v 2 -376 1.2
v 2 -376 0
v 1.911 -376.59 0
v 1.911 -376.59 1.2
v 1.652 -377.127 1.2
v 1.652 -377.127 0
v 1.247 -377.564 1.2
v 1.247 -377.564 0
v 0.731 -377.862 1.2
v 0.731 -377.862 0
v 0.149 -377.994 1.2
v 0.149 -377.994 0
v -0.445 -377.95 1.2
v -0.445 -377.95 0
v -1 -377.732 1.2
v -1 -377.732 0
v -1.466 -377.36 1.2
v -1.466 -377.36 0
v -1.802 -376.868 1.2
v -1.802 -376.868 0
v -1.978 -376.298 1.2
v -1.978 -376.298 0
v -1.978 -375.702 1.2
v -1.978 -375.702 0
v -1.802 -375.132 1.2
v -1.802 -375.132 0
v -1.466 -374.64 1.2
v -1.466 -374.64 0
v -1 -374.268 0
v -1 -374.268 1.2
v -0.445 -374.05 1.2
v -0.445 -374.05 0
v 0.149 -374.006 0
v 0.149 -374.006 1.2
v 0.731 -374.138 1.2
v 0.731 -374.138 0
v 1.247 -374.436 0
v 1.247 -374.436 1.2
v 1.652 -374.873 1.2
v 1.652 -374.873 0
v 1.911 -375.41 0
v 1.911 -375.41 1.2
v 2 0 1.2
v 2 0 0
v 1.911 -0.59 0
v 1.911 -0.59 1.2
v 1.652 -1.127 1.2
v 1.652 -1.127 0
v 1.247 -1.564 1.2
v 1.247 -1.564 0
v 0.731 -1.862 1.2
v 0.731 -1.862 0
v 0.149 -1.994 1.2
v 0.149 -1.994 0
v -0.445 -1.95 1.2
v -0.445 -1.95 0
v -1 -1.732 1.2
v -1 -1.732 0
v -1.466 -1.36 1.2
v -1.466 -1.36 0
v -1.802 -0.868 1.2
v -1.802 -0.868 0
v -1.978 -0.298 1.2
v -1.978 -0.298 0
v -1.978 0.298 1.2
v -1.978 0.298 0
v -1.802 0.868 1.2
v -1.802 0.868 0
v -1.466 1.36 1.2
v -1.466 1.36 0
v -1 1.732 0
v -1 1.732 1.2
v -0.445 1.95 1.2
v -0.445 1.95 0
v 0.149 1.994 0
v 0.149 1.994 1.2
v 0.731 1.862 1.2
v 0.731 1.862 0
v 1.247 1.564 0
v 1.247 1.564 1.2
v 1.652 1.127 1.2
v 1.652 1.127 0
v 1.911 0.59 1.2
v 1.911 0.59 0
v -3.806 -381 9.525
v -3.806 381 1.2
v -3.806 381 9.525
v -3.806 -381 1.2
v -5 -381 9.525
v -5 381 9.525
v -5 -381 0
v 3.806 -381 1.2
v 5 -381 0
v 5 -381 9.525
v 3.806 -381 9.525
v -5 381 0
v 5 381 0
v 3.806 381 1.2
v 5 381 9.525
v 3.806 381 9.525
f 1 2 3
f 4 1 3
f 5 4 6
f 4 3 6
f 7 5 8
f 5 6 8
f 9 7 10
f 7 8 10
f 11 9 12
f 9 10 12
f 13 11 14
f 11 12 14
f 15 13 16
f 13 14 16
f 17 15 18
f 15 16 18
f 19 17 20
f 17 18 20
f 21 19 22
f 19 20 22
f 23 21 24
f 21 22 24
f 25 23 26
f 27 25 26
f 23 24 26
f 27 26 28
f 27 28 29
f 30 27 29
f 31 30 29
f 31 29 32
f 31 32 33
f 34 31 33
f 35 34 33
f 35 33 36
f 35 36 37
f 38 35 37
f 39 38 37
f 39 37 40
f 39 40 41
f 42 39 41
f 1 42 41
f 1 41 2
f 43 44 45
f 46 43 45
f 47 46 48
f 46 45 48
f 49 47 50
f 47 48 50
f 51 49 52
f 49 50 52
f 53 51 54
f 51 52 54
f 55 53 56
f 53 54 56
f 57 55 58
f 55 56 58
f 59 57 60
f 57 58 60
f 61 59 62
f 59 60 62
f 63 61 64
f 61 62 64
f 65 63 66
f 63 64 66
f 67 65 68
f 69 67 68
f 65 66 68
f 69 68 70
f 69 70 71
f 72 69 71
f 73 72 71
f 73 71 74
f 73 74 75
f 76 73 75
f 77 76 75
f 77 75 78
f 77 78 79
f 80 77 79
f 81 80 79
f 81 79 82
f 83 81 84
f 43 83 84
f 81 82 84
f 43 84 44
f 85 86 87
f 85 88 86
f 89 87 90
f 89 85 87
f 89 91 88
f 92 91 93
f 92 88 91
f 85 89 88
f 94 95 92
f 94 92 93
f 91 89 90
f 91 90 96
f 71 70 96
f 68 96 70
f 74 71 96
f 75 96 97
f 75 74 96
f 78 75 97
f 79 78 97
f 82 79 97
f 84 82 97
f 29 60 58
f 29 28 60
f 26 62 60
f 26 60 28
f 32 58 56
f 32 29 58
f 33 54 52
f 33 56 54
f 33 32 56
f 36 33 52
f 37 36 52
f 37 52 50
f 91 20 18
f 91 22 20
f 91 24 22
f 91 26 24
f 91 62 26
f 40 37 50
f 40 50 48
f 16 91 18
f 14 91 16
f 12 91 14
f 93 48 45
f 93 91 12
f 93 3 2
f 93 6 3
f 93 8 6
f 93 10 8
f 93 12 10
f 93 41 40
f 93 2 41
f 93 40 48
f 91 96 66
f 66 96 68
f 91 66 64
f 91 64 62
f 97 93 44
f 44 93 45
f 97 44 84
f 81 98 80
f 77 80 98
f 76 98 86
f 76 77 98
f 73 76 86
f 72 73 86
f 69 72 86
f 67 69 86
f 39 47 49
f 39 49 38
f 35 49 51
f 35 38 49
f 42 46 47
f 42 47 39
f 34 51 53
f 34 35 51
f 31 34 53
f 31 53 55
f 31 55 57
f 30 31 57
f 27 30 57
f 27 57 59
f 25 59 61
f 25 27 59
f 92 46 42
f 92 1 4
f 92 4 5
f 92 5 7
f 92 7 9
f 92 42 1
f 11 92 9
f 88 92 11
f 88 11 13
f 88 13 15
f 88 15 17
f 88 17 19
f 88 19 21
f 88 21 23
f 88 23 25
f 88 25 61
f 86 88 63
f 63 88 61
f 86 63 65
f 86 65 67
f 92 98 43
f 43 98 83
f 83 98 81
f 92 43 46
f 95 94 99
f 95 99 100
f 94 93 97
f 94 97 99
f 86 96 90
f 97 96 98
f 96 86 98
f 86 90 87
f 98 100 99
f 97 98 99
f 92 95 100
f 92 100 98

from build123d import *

# Parameters (mm, degrees)
F1_DEPTH      = 381
F1_DEPTH_BACK = 381
F2_R          = 2
F3_DEPTH      = 1.2
F4_R          = 2
F5_DEPTH      = 9.526


with BuildPart() as f1:
    # F0 (on Front) → F1 (new body, two sides)
    with BuildSketch(Plane.XZ) as f1_sk:
        Polygon((-3.8062, 9.525), (-5, 9.525), (-5, 0), (0, 0), (5, 0), (5, 9.525), (3.8062, 9.525), (3.8062, 1.2), (-3.8062, 1.2), align=None)
    extrude(amount=F1_DEPTH)
    extrude(f1_sk.sketch, amount=-F1_DEPTH_BACK)

    # F2 (on face) → F3 (cut, through all)
    with BuildSketch(Plane(origin=(0, 0, 0), x_dir=(1, 0, 0), z_dir=(0, 0, -1))):
        Circle(F2_R)
    extrude(amount=-F3_DEPTH, mode=Mode.SUBTRACT)

    # F4 (on face) → F5 (cut, through all)
    with BuildSketch(Plane(origin=(0, 0, 0), x_dir=(1, 0, 0), z_dir=(0, 0, -1))):
        with Locations((0, 376)):
            Circle(F4_R)
    extrude(amount=-F5_DEPTH, mode=Mode.SUBTRACT)


solid = f1.part
